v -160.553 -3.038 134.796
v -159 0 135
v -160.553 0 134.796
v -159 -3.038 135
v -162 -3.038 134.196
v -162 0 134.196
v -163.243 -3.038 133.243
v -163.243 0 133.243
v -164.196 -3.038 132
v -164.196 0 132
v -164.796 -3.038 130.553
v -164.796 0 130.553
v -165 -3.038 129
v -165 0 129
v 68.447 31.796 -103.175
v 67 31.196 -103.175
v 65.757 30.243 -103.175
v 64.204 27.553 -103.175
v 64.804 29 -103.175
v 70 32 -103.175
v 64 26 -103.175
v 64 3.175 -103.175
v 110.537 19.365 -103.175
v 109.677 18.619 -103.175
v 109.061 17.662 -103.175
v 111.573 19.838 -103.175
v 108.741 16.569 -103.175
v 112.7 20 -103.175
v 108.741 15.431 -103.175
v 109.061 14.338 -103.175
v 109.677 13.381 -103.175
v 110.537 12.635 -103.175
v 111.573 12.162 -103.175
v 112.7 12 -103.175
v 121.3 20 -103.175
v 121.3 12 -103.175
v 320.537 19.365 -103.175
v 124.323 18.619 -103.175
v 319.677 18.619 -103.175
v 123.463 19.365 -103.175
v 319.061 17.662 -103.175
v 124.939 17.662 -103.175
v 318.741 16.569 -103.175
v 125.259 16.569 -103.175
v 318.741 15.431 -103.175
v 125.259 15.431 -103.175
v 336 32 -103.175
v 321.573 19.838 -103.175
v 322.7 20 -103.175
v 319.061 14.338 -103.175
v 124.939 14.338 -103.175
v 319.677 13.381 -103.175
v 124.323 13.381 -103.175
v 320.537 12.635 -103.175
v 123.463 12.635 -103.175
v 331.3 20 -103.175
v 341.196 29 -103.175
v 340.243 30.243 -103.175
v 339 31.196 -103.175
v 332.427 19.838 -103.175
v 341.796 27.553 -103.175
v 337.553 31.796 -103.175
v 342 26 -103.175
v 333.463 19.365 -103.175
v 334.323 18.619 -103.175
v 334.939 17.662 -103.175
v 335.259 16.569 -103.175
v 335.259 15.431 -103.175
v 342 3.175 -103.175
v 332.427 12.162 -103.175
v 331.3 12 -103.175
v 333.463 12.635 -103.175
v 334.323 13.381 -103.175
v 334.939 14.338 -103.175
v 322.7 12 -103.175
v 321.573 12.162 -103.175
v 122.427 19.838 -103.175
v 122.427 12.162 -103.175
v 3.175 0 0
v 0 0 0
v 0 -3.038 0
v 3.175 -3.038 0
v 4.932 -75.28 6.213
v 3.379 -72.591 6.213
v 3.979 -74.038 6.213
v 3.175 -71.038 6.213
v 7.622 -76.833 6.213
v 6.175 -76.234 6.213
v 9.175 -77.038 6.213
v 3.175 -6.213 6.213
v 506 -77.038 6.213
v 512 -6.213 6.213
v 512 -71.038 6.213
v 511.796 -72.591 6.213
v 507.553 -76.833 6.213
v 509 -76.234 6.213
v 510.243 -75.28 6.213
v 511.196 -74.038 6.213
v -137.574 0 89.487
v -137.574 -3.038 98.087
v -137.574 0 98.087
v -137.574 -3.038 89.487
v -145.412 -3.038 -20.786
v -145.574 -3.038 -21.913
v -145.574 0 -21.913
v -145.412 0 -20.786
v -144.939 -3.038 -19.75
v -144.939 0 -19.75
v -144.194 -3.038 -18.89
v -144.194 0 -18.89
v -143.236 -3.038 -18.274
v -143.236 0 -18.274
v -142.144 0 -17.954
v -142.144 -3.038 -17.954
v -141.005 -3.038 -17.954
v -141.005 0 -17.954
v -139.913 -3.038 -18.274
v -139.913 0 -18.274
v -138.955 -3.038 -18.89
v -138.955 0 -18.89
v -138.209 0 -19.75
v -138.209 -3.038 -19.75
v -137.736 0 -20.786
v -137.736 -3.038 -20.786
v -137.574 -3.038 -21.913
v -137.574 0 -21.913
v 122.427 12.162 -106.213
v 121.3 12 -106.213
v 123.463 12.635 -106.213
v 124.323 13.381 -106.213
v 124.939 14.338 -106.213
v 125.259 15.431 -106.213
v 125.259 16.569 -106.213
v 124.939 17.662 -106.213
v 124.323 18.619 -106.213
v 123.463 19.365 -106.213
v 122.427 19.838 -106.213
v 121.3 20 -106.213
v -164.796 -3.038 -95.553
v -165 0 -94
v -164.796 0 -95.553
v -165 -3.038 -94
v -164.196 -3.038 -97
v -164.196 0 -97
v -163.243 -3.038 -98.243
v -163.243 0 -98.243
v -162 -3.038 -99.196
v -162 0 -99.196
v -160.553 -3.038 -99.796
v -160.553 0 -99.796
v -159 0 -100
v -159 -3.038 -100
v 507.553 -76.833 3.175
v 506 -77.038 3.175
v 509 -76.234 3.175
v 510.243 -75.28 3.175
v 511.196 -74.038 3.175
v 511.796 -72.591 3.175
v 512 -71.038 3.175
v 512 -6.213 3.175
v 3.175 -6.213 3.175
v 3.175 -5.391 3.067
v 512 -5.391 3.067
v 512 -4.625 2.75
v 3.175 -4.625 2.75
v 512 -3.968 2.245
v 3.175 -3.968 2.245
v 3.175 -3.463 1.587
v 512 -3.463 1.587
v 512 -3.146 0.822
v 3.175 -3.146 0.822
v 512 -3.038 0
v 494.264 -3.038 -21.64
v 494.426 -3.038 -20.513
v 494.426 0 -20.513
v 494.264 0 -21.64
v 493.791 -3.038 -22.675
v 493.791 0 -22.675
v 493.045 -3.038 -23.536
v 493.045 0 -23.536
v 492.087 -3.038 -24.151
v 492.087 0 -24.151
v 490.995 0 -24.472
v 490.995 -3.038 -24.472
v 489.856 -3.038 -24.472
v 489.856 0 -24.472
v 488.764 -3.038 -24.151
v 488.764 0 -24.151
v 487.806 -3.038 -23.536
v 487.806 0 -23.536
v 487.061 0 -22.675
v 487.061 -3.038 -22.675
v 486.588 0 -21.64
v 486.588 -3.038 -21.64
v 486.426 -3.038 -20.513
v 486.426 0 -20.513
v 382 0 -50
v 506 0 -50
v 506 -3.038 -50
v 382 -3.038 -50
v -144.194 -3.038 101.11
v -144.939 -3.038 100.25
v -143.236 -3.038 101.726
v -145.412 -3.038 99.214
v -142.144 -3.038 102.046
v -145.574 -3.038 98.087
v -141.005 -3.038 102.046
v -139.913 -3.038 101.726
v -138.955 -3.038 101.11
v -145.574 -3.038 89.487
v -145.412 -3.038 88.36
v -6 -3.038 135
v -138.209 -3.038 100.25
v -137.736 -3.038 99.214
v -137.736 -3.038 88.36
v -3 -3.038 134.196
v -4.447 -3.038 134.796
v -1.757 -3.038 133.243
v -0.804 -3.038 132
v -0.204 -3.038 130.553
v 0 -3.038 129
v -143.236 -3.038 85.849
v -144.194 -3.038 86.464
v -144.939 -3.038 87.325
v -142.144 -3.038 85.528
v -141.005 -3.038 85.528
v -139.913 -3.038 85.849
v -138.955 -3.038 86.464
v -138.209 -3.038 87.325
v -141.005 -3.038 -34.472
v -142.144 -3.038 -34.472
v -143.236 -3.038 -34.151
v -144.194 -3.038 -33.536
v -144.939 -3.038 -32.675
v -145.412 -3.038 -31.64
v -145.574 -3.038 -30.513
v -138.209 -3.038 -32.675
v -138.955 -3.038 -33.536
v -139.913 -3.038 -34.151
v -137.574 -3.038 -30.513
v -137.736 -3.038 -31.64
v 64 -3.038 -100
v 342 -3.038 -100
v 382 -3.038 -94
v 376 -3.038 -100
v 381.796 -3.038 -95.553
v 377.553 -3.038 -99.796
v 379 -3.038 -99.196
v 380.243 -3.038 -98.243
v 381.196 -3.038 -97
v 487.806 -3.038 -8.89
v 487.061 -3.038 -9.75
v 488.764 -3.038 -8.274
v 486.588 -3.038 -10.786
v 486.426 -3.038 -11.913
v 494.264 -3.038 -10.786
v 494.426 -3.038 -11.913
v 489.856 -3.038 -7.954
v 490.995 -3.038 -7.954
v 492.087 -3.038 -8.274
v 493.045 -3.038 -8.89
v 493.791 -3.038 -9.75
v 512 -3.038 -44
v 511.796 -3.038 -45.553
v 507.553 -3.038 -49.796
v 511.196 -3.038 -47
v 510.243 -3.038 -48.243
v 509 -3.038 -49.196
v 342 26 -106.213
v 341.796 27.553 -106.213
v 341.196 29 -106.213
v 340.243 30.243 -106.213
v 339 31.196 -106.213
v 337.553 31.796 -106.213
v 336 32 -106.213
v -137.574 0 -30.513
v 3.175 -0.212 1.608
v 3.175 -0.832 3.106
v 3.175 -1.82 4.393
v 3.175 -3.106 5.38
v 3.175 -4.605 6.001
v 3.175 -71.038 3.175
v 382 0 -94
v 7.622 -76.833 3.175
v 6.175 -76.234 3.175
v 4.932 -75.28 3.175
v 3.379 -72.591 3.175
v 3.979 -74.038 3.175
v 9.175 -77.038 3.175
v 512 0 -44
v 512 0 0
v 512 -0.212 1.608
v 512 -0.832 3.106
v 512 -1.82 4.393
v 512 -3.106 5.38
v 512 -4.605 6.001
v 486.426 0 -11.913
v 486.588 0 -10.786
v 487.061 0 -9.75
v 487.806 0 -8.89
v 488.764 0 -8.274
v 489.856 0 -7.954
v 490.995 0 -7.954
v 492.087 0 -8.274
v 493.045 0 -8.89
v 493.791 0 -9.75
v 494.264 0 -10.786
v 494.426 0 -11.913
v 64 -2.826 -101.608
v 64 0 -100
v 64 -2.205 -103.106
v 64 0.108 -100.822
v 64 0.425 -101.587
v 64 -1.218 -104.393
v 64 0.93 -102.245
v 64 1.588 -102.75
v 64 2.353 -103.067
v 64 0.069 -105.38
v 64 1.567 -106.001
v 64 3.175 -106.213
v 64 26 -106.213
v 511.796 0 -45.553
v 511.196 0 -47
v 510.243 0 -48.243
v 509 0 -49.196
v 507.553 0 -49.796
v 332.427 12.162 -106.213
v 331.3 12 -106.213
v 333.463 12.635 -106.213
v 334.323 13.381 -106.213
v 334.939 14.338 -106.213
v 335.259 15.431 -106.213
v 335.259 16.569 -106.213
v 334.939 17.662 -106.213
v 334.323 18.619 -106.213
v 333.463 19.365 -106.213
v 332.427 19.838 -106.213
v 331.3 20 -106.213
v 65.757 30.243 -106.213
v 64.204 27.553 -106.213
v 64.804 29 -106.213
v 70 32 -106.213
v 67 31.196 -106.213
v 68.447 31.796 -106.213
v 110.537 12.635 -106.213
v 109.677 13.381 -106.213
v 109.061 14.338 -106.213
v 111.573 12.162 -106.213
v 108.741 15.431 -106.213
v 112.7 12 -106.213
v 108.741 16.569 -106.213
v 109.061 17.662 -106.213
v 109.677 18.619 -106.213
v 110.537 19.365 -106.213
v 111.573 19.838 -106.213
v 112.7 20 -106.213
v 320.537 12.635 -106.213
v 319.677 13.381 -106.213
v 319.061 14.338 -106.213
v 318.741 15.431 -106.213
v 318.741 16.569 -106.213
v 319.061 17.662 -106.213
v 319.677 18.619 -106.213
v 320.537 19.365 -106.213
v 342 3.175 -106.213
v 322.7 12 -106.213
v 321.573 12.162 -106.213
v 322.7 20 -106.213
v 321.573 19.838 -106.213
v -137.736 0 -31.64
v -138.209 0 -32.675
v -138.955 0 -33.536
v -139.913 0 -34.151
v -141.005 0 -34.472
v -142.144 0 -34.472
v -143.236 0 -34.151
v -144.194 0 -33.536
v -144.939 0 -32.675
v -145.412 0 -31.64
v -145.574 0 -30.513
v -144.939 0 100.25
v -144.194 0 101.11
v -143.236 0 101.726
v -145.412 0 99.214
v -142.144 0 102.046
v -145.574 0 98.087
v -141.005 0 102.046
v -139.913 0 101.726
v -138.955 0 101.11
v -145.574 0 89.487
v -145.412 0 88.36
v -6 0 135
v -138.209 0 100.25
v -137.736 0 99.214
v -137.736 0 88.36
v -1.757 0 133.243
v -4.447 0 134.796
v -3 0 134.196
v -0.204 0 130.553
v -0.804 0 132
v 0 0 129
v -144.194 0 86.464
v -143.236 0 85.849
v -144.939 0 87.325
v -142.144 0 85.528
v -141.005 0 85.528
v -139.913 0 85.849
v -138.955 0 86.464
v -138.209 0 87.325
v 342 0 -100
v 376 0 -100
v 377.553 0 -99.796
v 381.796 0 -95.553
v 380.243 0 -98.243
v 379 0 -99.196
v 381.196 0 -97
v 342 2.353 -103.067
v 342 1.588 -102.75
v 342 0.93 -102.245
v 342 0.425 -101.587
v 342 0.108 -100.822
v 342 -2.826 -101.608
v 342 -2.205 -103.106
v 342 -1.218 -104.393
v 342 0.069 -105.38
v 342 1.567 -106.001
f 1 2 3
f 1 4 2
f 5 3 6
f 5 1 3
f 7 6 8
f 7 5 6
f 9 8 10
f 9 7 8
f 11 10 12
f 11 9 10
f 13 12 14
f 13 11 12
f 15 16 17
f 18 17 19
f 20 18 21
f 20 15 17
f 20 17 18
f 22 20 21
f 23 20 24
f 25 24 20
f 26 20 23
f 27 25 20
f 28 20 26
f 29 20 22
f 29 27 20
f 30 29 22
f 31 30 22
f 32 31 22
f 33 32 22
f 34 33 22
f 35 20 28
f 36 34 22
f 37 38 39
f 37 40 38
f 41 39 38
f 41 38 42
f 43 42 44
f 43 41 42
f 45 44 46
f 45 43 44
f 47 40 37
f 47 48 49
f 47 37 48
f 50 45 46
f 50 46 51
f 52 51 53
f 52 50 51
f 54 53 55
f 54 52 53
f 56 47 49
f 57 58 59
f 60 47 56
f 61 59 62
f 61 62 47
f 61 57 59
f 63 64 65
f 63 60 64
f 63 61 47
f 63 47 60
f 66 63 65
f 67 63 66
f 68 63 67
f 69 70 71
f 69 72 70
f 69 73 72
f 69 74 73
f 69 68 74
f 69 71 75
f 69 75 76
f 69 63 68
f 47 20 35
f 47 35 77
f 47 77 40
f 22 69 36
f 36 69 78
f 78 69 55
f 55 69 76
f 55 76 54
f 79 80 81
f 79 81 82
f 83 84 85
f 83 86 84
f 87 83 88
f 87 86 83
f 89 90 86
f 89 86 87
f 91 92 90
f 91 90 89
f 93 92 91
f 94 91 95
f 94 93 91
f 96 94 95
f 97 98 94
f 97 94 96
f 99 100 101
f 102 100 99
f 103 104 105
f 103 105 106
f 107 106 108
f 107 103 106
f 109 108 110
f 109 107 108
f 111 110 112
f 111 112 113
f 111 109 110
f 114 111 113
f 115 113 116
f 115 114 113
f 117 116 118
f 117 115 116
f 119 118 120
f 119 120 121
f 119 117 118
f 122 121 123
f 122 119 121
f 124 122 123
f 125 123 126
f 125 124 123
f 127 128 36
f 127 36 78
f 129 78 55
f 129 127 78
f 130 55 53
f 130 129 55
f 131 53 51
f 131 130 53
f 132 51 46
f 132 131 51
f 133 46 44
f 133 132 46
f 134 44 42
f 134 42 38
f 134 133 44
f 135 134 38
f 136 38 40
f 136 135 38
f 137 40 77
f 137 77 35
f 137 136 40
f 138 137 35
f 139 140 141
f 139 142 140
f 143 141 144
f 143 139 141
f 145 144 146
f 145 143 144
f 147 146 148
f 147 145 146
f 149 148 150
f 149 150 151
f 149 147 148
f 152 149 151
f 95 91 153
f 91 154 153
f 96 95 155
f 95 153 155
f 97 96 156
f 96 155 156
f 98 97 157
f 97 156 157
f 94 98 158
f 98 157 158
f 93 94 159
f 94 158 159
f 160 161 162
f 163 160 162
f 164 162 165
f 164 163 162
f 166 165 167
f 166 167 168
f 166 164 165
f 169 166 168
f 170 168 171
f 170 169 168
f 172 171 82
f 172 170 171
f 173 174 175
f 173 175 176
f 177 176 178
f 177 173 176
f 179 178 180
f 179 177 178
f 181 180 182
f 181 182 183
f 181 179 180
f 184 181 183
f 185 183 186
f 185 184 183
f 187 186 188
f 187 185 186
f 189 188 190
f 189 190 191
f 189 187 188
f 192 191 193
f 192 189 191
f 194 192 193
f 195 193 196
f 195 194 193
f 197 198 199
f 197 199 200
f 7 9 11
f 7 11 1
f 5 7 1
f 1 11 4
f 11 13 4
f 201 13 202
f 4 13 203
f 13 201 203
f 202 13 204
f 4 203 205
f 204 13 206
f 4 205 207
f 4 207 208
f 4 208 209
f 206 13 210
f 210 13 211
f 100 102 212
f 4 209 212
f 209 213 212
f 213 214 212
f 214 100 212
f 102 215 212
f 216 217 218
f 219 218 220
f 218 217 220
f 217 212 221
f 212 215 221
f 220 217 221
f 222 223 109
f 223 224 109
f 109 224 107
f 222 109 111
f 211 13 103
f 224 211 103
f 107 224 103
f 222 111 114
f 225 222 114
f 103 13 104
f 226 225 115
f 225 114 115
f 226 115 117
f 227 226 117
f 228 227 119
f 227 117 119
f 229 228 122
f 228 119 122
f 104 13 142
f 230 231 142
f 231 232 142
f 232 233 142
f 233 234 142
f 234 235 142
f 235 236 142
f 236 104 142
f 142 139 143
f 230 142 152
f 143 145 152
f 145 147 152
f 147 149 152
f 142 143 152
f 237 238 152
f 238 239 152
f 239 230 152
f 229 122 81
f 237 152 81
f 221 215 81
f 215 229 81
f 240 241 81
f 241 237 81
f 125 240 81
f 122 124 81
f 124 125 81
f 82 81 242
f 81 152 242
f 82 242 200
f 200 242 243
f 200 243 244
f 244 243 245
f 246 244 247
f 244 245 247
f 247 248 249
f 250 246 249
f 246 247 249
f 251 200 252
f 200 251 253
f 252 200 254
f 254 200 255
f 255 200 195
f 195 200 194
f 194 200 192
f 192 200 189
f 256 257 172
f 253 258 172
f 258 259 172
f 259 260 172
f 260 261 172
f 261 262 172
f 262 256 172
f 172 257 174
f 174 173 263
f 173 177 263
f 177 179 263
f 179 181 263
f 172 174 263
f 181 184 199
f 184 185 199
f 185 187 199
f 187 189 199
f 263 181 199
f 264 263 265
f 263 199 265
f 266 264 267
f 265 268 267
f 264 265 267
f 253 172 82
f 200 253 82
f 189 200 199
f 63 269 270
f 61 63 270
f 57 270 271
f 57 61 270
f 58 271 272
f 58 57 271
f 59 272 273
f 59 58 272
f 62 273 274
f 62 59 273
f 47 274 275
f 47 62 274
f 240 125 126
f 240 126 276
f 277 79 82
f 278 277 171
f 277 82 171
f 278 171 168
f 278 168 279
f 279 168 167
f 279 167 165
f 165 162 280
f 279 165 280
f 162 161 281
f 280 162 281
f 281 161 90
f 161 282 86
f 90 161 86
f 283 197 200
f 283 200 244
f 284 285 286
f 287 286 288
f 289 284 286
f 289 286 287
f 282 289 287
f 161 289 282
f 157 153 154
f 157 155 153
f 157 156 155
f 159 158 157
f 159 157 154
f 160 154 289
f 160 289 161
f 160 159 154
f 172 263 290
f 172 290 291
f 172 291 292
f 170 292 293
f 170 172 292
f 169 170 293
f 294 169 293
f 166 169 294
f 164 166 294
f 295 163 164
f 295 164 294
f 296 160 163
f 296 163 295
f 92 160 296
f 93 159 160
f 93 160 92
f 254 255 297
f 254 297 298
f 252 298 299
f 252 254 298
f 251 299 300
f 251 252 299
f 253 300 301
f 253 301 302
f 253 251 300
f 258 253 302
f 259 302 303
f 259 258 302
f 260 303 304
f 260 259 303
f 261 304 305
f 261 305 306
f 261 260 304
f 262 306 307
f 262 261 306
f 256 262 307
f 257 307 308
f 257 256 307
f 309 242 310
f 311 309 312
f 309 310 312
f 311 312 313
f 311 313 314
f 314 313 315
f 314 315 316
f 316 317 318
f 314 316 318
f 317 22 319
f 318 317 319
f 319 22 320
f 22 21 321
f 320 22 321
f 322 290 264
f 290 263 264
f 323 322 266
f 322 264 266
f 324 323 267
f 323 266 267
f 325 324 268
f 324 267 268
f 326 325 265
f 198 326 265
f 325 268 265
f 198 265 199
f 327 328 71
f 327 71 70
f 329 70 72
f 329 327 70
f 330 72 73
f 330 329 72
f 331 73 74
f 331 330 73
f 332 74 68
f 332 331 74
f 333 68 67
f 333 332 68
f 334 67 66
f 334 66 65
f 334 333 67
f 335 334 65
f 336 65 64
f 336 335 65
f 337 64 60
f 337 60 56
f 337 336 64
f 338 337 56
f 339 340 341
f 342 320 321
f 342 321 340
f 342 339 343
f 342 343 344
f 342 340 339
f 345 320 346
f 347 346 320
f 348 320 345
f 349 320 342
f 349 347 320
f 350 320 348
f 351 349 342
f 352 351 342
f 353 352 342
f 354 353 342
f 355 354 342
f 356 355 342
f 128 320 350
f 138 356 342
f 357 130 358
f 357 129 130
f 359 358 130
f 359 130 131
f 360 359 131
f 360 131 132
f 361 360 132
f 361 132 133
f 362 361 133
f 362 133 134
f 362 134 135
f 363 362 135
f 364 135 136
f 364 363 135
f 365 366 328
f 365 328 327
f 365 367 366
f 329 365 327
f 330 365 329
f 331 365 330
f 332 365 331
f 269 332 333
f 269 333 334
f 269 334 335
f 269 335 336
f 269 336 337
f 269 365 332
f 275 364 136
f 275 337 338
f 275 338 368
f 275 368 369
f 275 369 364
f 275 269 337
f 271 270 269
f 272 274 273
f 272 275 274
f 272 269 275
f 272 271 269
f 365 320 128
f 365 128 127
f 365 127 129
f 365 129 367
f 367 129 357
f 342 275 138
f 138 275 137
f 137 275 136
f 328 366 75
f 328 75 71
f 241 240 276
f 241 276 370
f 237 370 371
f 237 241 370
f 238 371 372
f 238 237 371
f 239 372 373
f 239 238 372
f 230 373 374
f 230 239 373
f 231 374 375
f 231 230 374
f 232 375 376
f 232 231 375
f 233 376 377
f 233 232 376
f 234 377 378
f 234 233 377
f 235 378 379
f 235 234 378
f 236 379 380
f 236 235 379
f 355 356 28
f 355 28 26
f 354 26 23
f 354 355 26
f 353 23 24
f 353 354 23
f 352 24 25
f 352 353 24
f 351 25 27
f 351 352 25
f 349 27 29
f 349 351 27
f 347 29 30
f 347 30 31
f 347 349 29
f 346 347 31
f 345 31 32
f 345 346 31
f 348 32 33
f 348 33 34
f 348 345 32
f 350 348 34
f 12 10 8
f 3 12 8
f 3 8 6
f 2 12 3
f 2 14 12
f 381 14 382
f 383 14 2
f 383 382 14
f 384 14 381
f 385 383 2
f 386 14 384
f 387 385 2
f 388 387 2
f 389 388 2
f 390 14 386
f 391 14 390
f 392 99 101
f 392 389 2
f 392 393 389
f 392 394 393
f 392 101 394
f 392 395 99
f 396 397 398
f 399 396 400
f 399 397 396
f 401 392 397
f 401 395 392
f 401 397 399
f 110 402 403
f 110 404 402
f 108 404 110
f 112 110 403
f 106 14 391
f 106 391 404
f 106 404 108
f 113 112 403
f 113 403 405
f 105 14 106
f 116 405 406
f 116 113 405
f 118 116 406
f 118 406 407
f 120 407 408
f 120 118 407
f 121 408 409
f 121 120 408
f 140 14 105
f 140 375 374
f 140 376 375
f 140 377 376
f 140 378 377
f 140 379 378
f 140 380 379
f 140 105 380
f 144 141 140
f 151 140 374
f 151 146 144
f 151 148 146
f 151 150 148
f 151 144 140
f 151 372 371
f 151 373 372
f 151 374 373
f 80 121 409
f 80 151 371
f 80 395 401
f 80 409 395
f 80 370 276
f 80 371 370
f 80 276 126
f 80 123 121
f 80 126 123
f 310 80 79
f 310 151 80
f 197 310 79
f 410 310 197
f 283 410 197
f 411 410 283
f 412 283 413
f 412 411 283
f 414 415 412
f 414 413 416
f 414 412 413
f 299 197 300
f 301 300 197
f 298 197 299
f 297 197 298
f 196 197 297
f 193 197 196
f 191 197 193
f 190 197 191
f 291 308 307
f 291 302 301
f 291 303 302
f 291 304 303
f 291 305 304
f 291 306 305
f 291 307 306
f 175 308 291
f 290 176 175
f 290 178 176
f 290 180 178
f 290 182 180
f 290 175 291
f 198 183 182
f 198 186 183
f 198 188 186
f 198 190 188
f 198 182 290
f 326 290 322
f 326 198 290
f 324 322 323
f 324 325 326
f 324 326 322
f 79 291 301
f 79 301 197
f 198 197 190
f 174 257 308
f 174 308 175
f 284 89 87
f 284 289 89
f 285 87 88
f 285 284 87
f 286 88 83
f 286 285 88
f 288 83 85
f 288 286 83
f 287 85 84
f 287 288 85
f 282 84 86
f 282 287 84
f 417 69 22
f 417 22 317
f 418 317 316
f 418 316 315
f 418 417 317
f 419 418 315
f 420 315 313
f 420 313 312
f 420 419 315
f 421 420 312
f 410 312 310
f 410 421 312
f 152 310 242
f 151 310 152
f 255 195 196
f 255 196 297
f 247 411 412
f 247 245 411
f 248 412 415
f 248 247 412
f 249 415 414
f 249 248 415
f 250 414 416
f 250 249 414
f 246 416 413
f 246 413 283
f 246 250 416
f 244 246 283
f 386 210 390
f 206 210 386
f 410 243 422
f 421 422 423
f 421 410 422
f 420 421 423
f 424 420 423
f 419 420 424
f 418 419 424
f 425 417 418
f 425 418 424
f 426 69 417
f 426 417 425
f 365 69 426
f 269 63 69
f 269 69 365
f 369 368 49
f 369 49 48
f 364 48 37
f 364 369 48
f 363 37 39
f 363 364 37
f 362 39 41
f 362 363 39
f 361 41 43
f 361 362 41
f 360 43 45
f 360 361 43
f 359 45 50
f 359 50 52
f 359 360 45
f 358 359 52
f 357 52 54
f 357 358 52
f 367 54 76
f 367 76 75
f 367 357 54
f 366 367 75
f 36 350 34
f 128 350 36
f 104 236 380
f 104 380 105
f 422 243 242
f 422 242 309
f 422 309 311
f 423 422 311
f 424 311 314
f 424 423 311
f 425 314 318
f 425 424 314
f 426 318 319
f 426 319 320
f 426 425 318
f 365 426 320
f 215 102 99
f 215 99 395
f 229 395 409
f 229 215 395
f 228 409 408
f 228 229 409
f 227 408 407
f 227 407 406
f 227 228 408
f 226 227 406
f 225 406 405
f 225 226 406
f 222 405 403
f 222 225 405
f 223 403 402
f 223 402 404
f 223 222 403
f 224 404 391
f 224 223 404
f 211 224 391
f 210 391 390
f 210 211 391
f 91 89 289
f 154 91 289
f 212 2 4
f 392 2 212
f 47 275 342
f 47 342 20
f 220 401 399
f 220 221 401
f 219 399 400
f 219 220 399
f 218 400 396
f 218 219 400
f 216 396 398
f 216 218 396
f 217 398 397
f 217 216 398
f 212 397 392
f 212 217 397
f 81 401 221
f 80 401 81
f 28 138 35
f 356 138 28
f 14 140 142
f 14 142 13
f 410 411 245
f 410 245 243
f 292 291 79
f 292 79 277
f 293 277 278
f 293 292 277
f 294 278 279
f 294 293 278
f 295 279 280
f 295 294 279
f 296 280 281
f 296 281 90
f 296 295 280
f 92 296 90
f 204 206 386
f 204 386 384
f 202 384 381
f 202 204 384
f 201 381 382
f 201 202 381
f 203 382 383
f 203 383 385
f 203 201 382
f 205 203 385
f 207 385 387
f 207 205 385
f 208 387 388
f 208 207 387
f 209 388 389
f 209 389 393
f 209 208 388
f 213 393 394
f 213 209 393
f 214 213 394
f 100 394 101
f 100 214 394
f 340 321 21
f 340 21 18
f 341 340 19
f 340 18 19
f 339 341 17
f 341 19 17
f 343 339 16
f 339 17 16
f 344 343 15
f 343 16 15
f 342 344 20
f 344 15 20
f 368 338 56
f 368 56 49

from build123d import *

# Parameters (mm, degrees)
BASE_FLANGE1_DEPTH       = 3.03784
EDGE_FLANGE1_DEPTH       = 278
EDGE_FLANGE2_DEPTH       = 508.825
M6_START                 = -106.21284
M6_CLEARANCE_SLOT1_DEPTH = 3.03784
M6_START_2               = -3.03784
M6_CLEARANCE_SLOT2_DEPTH = 3.03784
FILLET1_R                = 6


# Read off the part's stored shape, not the designer's step: M6 Clearance Slot1, M6 Clearance Slot2
# Sheet-metal steps are written as plain solids
with BuildPart() as part:
    # Sketch1 → Base-Flange1 (new body)
    with BuildSketch(Plane(origin=(0, 0, 0), x_dir=(1, 0, 0), z_dir=(0, 1, 0))):
        Polygon((0, -135), (0, 0), (512, 0), (512, 50), (382, 50), (382, 100), (-165, 100), (-165, -135), align=None)
    extrude(amount=-BASE_FLANGE1_DEPTH)

    # Edge-Flange1 section (across the edge) → Edge-Flange1 (add)
    with BuildSketch(Plane(origin=(342, 0, -103.175), x_dir=(0, 0, 1), z_dir=(-1, 0, 0))):
        with BuildLine():
            Line((-3.03784, 3.175), (-3.03784, 32))
            Line((-3.03784, 32), (0, 32))
            Line((0, 32), (0, 3.175))
            ThreePointArc((0, 3.175), (0.92993597, 0.92993597), (3.175, 0))
            Line((3.175, 0), (3.175, -3.03784))
            ThreePointArc((3.175, -3.03784), (-1.218141294, -1.218141294), (-3.03784, 3.175))
        make_face()
    extrude(amount=EDGE_FLANGE1_DEPTH)

    # Edge-Flange2 section (across the edge) → Edge-Flange2 (add)
    with BuildSketch(Plane(origin=(512, -3.03784, 3.175), x_dir=(0, 0, -1), z_dir=(-1, 0, 0))):
        with BuildLine():
            Line((-3.03784, 3.175), (-3.03784, 74))
            Line((-3.03784, 74), (0, 74))
            Line((0, 74), (0, 3.175))
            ThreePointArc((0, 3.175), (0.92993597, 0.92993597), (3.175, 0))
            Line((3.175, 0), (3.175, -3.03784))
            ThreePointArc((3.175, -3.03784), (-1.218141294, -1.218141294), (-3.03784, 3.175))
        make_face()
    extrude(amount=EDGE_FLANGE2_DEPTH)

    # M6 Clearance Slot1 outline → M6 Clearance Slot1 (cut)
    with BuildSketch(Plane.XY.offset(M6_START)):
        with BuildLine():
            Line((112.7, 12), (121.3, 12))
            ThreePointArc((121.3, 12), (125.3, 16), (121.3, 20))
            Line((121.3, 20), (112.7, 20))
            ThreePointArc((112.7, 20), (108.7, 16), (112.7, 12))
        make_face()
        with BuildLine():
            ThreePointArc((331.3, 12), (335.3, 16), (331.3, 20))
            Line((331.3, 20), (322.7, 20))
            ThreePointArc((322.7, 20), (318.7, 16), (322.7, 12))
            Line((322.7, 12), (331.3, 12))
        make_face()
    extrude(amount=M6_CLEARANCE_SLOT1_DEPTH, mode=Mode.SUBTRACT)

    # M6 Clearance Slot2 outline → M6 Clearance Slot2 (cut)
    with BuildSketch(Plane(origin=(0, 0, 0), x_dir=(1, 0, 0), z_dir=(0, 1, 0)).offset(M6_START_2)):
        with BuildLine():
            Line((-137.57432, -98.08716), (-137.57432, -89.48716))
            ThreePointArc((-137.57432, -89.48716), (-141.57432, -85.48716), (-145.57432, -89.48716))
            Line((-145.57432, -89.48716), (-145.57432, -98.08716))
            ThreePointArc((-145.57432, -98.08716), (-141.57432, -102.08716), (-137.57432, -98.08716))
        make_face()
        with BuildLine():
            ThreePointArc((-137.57432, 30.51284), (-141.57432, 34.51284), (-145.57432, 30.51284))
            Line((-145.57432, 30.51284), (-145.57432, 21.91284))
            ThreePointArc((-145.57432, 21.91284), (-141.57432, 17.91284), (-137.57432, 21.91284))
            Line((-137.57432, 21.91284), (-137.57432, 30.51284))
        make_face()
        with BuildLine():
            Line((494.42568, 11.91284), (494.42568, 20.51284))
            ThreePointArc((494.42568, 20.51284), (490.42568, 24.51284), (486.42568, 20.51284))
            Line((486.42568, 20.51284), (486.42568, 11.91284))
            ThreePointArc((486.42568, 11.91284), (490.42568, 7.91284), (494.42568, 11.91284))
        make_face()
    extrude(amount=M6_CLEARANCE_SLOT2_DEPTH, mode=Mode.SUBTRACT)

    # Fillet1
    fillet1_edges = [part.edges().sort_by_distance(p)[0] for p in [
        (-165, -1.51892, -100),
        (382, -1.51892, -100),
        (512, -1.51892, -50),
        (0, -1.51892, 135),
        (-165, -1.51892, 135),
        (342, 32, -104.69392),
        (64, 32, -104.69392),
        (512, -77.03784, 4.69392),
        (3.175, -77.03784, 4.69392),
    ]]
    fillet(fillet1_edges, radius=FILLET1_R)


solid = part.part
